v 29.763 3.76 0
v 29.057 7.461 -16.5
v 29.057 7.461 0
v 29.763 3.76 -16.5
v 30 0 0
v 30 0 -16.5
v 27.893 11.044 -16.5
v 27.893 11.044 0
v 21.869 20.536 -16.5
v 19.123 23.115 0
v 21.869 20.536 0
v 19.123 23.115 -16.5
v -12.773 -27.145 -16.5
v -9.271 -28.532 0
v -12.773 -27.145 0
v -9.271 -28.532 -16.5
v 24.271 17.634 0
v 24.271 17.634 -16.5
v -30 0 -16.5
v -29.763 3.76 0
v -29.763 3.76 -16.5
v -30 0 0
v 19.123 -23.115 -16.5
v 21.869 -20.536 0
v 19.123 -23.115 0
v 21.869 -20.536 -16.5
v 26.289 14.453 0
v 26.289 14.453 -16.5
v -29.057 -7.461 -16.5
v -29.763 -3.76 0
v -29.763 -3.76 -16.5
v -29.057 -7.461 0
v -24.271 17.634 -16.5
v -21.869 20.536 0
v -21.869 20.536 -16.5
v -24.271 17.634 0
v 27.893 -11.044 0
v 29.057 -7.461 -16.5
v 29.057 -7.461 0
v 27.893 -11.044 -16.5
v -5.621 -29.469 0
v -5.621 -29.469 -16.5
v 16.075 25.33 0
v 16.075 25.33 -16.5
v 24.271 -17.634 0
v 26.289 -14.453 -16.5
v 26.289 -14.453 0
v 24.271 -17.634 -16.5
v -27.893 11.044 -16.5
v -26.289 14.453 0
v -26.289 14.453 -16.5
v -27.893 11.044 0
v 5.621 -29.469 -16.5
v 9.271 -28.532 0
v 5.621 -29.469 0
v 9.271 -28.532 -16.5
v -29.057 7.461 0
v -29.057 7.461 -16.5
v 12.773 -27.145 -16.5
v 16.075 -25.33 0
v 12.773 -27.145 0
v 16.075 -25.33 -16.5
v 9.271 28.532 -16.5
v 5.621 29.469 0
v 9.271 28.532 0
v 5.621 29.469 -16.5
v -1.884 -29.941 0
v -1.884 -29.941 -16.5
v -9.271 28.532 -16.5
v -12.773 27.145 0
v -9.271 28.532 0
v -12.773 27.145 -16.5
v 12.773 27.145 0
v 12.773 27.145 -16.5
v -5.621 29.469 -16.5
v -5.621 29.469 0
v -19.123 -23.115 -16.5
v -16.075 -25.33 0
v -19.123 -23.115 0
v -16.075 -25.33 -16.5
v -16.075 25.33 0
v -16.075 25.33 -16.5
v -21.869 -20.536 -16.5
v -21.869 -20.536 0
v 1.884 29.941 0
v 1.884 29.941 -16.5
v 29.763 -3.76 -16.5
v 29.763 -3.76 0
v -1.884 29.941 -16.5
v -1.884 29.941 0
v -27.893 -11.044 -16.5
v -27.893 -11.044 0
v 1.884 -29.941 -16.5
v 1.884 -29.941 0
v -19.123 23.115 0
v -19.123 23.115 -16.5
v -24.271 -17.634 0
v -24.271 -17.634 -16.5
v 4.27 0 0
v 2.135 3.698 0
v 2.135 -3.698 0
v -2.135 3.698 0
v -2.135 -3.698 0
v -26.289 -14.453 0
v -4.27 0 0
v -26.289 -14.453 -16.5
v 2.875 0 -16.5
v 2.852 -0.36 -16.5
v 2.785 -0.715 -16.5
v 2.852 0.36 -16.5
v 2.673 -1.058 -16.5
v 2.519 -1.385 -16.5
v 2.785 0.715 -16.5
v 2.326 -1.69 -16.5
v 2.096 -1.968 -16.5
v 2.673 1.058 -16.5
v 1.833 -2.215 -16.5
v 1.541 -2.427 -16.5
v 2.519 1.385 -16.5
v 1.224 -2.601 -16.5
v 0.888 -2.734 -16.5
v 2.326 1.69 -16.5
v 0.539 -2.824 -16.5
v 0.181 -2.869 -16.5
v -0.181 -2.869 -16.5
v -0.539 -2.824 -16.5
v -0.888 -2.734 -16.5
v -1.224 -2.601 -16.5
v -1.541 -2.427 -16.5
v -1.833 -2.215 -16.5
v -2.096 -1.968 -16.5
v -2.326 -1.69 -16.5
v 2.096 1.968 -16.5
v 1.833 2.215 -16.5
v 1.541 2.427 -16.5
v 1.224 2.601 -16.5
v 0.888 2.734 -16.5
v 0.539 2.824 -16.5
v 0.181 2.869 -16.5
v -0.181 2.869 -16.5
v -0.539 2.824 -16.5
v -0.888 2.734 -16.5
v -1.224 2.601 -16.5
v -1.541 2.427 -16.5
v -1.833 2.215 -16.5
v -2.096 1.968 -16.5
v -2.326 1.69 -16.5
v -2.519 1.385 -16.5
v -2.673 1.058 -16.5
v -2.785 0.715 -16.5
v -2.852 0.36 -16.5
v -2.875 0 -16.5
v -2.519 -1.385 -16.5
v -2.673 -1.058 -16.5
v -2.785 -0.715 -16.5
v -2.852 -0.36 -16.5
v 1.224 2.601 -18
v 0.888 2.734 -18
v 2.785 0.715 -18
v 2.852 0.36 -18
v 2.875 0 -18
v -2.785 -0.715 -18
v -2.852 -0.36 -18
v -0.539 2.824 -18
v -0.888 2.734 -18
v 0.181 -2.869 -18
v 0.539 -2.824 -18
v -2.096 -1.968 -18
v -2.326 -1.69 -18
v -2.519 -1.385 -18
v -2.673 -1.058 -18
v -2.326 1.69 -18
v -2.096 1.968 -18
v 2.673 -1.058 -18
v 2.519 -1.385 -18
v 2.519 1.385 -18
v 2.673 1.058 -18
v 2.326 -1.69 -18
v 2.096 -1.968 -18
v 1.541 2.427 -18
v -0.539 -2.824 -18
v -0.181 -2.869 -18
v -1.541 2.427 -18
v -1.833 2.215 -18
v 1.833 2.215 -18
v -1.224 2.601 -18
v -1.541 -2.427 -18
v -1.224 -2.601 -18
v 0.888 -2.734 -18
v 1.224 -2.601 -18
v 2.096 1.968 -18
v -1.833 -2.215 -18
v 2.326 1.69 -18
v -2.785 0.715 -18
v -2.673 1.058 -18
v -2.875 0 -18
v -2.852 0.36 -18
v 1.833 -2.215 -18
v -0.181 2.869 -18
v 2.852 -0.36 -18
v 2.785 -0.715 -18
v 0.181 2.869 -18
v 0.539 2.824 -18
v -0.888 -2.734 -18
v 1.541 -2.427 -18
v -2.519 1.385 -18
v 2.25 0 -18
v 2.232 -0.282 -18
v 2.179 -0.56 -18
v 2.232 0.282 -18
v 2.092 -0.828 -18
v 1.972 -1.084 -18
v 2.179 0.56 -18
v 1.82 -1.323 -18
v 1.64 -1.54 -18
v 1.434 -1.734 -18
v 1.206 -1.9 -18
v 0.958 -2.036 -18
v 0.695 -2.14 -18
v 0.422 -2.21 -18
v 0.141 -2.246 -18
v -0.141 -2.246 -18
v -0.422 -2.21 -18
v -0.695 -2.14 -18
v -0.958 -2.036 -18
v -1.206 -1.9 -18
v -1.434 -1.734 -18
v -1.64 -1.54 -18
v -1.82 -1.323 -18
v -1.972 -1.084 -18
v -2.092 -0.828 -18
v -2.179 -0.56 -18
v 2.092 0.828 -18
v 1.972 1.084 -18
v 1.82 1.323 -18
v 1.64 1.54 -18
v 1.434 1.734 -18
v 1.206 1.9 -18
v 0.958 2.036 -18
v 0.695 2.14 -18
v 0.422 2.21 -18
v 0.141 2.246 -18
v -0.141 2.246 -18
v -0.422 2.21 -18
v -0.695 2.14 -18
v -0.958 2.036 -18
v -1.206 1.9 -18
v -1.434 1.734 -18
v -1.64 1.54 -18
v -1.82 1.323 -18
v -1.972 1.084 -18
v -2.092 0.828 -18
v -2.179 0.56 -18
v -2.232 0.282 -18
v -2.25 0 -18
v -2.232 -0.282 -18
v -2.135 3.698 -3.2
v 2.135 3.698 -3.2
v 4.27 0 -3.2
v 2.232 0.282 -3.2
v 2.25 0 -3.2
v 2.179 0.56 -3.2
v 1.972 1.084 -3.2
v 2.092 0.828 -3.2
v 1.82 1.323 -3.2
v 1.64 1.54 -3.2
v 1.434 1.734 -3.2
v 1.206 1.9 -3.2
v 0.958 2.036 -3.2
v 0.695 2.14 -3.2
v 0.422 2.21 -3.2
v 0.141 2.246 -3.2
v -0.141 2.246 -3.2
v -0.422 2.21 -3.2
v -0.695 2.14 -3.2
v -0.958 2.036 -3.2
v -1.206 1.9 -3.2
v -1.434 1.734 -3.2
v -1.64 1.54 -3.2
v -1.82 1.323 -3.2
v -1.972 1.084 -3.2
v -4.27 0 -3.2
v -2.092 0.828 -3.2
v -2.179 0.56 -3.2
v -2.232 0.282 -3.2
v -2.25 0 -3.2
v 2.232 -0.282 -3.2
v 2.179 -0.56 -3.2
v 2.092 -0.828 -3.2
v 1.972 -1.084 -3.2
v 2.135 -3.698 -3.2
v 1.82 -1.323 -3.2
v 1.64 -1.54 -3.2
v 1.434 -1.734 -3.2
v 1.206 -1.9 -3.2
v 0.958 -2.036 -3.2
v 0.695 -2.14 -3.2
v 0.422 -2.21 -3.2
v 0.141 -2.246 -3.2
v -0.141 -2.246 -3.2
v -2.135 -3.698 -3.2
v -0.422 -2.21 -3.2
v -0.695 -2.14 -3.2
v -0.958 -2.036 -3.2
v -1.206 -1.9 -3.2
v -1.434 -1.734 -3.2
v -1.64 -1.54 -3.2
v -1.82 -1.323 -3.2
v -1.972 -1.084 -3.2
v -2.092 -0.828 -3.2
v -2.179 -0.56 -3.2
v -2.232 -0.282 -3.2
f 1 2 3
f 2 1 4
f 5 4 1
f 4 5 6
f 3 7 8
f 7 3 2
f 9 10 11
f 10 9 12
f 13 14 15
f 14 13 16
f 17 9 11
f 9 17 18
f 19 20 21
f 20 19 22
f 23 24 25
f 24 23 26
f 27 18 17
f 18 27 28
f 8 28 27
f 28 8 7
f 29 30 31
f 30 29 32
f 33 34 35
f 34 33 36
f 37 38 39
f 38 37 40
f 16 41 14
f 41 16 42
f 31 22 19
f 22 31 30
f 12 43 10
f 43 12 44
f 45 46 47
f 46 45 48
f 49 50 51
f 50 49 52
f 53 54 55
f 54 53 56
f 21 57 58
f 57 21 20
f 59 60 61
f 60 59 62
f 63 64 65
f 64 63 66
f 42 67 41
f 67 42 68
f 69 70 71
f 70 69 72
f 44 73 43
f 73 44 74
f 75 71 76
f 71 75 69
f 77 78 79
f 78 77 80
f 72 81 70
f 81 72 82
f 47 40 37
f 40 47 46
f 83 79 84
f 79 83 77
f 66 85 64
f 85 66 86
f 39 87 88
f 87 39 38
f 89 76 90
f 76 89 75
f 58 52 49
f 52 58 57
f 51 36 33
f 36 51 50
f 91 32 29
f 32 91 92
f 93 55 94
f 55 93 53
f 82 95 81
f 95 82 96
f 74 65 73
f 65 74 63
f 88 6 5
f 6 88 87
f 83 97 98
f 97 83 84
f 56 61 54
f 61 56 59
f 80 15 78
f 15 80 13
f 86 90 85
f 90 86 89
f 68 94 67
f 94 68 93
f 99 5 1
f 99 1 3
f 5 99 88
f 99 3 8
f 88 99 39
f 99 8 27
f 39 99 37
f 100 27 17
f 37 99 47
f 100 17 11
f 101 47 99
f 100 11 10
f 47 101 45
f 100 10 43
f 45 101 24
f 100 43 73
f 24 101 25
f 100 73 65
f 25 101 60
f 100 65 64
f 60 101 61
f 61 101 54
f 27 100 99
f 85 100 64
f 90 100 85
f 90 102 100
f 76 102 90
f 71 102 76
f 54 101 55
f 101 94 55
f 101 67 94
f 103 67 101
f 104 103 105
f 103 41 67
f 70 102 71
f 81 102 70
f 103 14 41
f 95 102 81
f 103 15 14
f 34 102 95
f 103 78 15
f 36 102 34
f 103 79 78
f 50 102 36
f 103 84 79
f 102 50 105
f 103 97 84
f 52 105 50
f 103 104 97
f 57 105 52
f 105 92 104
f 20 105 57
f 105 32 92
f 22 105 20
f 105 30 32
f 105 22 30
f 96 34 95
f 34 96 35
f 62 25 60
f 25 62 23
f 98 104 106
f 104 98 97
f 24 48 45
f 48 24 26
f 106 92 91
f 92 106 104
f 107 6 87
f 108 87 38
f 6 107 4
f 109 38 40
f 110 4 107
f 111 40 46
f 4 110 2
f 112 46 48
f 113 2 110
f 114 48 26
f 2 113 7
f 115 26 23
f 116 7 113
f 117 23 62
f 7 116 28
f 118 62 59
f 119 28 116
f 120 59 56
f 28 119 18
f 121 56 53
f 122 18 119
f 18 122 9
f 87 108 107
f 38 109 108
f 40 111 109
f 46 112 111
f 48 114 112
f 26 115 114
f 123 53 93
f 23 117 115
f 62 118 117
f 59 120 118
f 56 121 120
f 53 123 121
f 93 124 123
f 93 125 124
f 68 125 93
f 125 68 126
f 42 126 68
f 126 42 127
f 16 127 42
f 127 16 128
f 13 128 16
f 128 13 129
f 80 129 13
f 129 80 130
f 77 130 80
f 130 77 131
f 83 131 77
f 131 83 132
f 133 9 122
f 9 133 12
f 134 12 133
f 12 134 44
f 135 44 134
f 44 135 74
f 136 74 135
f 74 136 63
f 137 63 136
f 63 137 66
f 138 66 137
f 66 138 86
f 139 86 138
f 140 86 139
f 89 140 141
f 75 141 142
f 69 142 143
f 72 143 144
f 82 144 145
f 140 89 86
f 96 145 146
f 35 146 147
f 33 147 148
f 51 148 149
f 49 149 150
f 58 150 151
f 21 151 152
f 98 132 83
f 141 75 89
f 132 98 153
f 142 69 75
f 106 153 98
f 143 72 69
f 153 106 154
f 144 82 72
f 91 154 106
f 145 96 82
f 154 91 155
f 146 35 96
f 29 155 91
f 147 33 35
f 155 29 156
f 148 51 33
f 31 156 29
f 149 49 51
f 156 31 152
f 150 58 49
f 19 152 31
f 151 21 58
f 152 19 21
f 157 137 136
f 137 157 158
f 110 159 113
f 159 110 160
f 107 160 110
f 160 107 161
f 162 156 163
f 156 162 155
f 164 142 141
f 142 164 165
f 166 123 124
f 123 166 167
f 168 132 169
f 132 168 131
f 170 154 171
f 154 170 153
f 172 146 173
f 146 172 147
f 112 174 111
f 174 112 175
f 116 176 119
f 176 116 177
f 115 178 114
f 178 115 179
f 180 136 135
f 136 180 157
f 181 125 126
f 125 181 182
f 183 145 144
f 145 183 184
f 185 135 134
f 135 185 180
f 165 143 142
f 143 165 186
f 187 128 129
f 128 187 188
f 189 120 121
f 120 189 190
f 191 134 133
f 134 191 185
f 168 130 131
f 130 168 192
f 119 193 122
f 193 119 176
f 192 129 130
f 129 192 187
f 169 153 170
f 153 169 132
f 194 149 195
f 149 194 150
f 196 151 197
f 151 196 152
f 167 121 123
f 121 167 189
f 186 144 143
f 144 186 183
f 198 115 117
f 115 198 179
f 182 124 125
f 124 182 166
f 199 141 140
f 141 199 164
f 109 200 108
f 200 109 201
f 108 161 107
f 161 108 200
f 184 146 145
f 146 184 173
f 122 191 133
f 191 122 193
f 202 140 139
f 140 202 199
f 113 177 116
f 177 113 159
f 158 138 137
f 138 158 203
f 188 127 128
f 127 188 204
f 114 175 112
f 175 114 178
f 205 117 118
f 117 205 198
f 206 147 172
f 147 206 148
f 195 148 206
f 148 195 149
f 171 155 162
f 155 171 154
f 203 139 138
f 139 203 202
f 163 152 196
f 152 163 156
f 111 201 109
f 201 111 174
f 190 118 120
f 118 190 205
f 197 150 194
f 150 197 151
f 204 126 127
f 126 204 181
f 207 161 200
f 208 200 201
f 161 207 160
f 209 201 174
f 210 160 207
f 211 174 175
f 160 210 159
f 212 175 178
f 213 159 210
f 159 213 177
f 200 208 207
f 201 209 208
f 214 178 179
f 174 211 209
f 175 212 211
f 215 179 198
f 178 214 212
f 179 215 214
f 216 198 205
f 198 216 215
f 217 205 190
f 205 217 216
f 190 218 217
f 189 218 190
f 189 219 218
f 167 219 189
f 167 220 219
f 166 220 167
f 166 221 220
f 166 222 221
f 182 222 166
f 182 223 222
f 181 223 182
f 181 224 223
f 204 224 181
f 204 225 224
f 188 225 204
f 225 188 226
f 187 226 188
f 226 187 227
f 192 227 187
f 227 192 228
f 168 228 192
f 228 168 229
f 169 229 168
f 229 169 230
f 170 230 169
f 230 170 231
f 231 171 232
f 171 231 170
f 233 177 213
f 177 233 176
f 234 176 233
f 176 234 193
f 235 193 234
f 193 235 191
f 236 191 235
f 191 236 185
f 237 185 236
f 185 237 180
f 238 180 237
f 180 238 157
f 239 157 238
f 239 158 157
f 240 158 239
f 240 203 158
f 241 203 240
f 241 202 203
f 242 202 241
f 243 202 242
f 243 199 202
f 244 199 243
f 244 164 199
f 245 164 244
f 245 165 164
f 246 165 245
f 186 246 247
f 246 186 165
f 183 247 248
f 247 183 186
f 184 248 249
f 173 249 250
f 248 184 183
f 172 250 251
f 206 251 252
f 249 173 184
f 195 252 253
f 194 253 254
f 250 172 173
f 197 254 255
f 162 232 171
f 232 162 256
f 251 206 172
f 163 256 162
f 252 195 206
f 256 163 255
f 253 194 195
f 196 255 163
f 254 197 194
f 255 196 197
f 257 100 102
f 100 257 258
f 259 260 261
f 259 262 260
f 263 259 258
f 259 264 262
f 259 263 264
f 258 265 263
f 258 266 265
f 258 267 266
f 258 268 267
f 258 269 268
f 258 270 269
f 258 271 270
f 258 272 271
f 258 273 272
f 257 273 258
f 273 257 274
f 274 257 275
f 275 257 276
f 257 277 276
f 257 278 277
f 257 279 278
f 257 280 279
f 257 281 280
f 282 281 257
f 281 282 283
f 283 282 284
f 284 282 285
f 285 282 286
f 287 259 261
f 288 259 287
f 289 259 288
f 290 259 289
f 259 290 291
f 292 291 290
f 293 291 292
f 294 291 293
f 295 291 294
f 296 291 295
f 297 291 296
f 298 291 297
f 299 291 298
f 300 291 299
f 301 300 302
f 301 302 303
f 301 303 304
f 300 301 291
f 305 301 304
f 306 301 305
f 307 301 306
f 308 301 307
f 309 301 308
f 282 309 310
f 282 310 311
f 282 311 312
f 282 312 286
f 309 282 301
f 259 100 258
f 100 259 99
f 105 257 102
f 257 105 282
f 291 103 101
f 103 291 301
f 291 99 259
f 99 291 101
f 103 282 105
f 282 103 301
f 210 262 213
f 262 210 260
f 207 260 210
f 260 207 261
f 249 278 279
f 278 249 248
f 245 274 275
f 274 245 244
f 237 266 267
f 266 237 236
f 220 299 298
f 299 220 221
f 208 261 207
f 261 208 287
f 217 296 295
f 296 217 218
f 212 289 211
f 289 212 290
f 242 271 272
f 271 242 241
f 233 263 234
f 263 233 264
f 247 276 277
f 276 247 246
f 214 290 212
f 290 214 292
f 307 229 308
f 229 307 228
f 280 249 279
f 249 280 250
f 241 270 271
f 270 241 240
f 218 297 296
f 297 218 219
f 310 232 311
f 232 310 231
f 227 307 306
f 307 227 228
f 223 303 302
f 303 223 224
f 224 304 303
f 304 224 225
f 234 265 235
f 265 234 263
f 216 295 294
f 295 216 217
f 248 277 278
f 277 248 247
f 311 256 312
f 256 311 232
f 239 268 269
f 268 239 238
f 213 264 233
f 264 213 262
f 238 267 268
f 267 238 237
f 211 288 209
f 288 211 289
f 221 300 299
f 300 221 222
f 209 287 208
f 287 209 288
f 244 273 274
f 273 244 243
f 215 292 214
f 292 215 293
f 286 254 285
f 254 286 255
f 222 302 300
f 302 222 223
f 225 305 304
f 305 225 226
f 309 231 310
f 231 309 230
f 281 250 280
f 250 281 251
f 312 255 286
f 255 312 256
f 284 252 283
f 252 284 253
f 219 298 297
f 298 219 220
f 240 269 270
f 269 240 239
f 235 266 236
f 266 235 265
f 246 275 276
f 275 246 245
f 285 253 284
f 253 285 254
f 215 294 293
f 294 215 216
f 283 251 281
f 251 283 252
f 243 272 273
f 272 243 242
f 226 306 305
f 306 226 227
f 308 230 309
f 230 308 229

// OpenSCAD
$fn = 50;

difference() {
	union() {
		translate(v = [0, 0, -16.5]) {
			cylinder(h = 16.5, r = 30.0);
		}
		#translate(v = [0, 0, -18.0]) {
			cylinder(h = 18, r = 2.875);
		}
	}
	union() {
		translate(v = [0, 0, 0]) {
			rotate(a = [0, 0, 0]) {
				difference() {
					union() {
						translate(v = [0, 0, -3.2]) {
							linear_extrude(height = 3.2) {
								polygon(points = [[4.2698, 0.0], [2.1349000000000005, 3.697755269078796], [-2.134899999999999, 3.6977552690787965], [-4.2698, 5.228996902999369e-16], [-2.134900000000002, -3.6977552690787956], [2.1348999999999974, -3.697755269078798]]);
							}
						}
					}
					union();
				}
			}
		}
		#translate(v = [0, 0, -100.0]) {
			cylinder(h = 200, r = 2.25);
		}
	}
}
